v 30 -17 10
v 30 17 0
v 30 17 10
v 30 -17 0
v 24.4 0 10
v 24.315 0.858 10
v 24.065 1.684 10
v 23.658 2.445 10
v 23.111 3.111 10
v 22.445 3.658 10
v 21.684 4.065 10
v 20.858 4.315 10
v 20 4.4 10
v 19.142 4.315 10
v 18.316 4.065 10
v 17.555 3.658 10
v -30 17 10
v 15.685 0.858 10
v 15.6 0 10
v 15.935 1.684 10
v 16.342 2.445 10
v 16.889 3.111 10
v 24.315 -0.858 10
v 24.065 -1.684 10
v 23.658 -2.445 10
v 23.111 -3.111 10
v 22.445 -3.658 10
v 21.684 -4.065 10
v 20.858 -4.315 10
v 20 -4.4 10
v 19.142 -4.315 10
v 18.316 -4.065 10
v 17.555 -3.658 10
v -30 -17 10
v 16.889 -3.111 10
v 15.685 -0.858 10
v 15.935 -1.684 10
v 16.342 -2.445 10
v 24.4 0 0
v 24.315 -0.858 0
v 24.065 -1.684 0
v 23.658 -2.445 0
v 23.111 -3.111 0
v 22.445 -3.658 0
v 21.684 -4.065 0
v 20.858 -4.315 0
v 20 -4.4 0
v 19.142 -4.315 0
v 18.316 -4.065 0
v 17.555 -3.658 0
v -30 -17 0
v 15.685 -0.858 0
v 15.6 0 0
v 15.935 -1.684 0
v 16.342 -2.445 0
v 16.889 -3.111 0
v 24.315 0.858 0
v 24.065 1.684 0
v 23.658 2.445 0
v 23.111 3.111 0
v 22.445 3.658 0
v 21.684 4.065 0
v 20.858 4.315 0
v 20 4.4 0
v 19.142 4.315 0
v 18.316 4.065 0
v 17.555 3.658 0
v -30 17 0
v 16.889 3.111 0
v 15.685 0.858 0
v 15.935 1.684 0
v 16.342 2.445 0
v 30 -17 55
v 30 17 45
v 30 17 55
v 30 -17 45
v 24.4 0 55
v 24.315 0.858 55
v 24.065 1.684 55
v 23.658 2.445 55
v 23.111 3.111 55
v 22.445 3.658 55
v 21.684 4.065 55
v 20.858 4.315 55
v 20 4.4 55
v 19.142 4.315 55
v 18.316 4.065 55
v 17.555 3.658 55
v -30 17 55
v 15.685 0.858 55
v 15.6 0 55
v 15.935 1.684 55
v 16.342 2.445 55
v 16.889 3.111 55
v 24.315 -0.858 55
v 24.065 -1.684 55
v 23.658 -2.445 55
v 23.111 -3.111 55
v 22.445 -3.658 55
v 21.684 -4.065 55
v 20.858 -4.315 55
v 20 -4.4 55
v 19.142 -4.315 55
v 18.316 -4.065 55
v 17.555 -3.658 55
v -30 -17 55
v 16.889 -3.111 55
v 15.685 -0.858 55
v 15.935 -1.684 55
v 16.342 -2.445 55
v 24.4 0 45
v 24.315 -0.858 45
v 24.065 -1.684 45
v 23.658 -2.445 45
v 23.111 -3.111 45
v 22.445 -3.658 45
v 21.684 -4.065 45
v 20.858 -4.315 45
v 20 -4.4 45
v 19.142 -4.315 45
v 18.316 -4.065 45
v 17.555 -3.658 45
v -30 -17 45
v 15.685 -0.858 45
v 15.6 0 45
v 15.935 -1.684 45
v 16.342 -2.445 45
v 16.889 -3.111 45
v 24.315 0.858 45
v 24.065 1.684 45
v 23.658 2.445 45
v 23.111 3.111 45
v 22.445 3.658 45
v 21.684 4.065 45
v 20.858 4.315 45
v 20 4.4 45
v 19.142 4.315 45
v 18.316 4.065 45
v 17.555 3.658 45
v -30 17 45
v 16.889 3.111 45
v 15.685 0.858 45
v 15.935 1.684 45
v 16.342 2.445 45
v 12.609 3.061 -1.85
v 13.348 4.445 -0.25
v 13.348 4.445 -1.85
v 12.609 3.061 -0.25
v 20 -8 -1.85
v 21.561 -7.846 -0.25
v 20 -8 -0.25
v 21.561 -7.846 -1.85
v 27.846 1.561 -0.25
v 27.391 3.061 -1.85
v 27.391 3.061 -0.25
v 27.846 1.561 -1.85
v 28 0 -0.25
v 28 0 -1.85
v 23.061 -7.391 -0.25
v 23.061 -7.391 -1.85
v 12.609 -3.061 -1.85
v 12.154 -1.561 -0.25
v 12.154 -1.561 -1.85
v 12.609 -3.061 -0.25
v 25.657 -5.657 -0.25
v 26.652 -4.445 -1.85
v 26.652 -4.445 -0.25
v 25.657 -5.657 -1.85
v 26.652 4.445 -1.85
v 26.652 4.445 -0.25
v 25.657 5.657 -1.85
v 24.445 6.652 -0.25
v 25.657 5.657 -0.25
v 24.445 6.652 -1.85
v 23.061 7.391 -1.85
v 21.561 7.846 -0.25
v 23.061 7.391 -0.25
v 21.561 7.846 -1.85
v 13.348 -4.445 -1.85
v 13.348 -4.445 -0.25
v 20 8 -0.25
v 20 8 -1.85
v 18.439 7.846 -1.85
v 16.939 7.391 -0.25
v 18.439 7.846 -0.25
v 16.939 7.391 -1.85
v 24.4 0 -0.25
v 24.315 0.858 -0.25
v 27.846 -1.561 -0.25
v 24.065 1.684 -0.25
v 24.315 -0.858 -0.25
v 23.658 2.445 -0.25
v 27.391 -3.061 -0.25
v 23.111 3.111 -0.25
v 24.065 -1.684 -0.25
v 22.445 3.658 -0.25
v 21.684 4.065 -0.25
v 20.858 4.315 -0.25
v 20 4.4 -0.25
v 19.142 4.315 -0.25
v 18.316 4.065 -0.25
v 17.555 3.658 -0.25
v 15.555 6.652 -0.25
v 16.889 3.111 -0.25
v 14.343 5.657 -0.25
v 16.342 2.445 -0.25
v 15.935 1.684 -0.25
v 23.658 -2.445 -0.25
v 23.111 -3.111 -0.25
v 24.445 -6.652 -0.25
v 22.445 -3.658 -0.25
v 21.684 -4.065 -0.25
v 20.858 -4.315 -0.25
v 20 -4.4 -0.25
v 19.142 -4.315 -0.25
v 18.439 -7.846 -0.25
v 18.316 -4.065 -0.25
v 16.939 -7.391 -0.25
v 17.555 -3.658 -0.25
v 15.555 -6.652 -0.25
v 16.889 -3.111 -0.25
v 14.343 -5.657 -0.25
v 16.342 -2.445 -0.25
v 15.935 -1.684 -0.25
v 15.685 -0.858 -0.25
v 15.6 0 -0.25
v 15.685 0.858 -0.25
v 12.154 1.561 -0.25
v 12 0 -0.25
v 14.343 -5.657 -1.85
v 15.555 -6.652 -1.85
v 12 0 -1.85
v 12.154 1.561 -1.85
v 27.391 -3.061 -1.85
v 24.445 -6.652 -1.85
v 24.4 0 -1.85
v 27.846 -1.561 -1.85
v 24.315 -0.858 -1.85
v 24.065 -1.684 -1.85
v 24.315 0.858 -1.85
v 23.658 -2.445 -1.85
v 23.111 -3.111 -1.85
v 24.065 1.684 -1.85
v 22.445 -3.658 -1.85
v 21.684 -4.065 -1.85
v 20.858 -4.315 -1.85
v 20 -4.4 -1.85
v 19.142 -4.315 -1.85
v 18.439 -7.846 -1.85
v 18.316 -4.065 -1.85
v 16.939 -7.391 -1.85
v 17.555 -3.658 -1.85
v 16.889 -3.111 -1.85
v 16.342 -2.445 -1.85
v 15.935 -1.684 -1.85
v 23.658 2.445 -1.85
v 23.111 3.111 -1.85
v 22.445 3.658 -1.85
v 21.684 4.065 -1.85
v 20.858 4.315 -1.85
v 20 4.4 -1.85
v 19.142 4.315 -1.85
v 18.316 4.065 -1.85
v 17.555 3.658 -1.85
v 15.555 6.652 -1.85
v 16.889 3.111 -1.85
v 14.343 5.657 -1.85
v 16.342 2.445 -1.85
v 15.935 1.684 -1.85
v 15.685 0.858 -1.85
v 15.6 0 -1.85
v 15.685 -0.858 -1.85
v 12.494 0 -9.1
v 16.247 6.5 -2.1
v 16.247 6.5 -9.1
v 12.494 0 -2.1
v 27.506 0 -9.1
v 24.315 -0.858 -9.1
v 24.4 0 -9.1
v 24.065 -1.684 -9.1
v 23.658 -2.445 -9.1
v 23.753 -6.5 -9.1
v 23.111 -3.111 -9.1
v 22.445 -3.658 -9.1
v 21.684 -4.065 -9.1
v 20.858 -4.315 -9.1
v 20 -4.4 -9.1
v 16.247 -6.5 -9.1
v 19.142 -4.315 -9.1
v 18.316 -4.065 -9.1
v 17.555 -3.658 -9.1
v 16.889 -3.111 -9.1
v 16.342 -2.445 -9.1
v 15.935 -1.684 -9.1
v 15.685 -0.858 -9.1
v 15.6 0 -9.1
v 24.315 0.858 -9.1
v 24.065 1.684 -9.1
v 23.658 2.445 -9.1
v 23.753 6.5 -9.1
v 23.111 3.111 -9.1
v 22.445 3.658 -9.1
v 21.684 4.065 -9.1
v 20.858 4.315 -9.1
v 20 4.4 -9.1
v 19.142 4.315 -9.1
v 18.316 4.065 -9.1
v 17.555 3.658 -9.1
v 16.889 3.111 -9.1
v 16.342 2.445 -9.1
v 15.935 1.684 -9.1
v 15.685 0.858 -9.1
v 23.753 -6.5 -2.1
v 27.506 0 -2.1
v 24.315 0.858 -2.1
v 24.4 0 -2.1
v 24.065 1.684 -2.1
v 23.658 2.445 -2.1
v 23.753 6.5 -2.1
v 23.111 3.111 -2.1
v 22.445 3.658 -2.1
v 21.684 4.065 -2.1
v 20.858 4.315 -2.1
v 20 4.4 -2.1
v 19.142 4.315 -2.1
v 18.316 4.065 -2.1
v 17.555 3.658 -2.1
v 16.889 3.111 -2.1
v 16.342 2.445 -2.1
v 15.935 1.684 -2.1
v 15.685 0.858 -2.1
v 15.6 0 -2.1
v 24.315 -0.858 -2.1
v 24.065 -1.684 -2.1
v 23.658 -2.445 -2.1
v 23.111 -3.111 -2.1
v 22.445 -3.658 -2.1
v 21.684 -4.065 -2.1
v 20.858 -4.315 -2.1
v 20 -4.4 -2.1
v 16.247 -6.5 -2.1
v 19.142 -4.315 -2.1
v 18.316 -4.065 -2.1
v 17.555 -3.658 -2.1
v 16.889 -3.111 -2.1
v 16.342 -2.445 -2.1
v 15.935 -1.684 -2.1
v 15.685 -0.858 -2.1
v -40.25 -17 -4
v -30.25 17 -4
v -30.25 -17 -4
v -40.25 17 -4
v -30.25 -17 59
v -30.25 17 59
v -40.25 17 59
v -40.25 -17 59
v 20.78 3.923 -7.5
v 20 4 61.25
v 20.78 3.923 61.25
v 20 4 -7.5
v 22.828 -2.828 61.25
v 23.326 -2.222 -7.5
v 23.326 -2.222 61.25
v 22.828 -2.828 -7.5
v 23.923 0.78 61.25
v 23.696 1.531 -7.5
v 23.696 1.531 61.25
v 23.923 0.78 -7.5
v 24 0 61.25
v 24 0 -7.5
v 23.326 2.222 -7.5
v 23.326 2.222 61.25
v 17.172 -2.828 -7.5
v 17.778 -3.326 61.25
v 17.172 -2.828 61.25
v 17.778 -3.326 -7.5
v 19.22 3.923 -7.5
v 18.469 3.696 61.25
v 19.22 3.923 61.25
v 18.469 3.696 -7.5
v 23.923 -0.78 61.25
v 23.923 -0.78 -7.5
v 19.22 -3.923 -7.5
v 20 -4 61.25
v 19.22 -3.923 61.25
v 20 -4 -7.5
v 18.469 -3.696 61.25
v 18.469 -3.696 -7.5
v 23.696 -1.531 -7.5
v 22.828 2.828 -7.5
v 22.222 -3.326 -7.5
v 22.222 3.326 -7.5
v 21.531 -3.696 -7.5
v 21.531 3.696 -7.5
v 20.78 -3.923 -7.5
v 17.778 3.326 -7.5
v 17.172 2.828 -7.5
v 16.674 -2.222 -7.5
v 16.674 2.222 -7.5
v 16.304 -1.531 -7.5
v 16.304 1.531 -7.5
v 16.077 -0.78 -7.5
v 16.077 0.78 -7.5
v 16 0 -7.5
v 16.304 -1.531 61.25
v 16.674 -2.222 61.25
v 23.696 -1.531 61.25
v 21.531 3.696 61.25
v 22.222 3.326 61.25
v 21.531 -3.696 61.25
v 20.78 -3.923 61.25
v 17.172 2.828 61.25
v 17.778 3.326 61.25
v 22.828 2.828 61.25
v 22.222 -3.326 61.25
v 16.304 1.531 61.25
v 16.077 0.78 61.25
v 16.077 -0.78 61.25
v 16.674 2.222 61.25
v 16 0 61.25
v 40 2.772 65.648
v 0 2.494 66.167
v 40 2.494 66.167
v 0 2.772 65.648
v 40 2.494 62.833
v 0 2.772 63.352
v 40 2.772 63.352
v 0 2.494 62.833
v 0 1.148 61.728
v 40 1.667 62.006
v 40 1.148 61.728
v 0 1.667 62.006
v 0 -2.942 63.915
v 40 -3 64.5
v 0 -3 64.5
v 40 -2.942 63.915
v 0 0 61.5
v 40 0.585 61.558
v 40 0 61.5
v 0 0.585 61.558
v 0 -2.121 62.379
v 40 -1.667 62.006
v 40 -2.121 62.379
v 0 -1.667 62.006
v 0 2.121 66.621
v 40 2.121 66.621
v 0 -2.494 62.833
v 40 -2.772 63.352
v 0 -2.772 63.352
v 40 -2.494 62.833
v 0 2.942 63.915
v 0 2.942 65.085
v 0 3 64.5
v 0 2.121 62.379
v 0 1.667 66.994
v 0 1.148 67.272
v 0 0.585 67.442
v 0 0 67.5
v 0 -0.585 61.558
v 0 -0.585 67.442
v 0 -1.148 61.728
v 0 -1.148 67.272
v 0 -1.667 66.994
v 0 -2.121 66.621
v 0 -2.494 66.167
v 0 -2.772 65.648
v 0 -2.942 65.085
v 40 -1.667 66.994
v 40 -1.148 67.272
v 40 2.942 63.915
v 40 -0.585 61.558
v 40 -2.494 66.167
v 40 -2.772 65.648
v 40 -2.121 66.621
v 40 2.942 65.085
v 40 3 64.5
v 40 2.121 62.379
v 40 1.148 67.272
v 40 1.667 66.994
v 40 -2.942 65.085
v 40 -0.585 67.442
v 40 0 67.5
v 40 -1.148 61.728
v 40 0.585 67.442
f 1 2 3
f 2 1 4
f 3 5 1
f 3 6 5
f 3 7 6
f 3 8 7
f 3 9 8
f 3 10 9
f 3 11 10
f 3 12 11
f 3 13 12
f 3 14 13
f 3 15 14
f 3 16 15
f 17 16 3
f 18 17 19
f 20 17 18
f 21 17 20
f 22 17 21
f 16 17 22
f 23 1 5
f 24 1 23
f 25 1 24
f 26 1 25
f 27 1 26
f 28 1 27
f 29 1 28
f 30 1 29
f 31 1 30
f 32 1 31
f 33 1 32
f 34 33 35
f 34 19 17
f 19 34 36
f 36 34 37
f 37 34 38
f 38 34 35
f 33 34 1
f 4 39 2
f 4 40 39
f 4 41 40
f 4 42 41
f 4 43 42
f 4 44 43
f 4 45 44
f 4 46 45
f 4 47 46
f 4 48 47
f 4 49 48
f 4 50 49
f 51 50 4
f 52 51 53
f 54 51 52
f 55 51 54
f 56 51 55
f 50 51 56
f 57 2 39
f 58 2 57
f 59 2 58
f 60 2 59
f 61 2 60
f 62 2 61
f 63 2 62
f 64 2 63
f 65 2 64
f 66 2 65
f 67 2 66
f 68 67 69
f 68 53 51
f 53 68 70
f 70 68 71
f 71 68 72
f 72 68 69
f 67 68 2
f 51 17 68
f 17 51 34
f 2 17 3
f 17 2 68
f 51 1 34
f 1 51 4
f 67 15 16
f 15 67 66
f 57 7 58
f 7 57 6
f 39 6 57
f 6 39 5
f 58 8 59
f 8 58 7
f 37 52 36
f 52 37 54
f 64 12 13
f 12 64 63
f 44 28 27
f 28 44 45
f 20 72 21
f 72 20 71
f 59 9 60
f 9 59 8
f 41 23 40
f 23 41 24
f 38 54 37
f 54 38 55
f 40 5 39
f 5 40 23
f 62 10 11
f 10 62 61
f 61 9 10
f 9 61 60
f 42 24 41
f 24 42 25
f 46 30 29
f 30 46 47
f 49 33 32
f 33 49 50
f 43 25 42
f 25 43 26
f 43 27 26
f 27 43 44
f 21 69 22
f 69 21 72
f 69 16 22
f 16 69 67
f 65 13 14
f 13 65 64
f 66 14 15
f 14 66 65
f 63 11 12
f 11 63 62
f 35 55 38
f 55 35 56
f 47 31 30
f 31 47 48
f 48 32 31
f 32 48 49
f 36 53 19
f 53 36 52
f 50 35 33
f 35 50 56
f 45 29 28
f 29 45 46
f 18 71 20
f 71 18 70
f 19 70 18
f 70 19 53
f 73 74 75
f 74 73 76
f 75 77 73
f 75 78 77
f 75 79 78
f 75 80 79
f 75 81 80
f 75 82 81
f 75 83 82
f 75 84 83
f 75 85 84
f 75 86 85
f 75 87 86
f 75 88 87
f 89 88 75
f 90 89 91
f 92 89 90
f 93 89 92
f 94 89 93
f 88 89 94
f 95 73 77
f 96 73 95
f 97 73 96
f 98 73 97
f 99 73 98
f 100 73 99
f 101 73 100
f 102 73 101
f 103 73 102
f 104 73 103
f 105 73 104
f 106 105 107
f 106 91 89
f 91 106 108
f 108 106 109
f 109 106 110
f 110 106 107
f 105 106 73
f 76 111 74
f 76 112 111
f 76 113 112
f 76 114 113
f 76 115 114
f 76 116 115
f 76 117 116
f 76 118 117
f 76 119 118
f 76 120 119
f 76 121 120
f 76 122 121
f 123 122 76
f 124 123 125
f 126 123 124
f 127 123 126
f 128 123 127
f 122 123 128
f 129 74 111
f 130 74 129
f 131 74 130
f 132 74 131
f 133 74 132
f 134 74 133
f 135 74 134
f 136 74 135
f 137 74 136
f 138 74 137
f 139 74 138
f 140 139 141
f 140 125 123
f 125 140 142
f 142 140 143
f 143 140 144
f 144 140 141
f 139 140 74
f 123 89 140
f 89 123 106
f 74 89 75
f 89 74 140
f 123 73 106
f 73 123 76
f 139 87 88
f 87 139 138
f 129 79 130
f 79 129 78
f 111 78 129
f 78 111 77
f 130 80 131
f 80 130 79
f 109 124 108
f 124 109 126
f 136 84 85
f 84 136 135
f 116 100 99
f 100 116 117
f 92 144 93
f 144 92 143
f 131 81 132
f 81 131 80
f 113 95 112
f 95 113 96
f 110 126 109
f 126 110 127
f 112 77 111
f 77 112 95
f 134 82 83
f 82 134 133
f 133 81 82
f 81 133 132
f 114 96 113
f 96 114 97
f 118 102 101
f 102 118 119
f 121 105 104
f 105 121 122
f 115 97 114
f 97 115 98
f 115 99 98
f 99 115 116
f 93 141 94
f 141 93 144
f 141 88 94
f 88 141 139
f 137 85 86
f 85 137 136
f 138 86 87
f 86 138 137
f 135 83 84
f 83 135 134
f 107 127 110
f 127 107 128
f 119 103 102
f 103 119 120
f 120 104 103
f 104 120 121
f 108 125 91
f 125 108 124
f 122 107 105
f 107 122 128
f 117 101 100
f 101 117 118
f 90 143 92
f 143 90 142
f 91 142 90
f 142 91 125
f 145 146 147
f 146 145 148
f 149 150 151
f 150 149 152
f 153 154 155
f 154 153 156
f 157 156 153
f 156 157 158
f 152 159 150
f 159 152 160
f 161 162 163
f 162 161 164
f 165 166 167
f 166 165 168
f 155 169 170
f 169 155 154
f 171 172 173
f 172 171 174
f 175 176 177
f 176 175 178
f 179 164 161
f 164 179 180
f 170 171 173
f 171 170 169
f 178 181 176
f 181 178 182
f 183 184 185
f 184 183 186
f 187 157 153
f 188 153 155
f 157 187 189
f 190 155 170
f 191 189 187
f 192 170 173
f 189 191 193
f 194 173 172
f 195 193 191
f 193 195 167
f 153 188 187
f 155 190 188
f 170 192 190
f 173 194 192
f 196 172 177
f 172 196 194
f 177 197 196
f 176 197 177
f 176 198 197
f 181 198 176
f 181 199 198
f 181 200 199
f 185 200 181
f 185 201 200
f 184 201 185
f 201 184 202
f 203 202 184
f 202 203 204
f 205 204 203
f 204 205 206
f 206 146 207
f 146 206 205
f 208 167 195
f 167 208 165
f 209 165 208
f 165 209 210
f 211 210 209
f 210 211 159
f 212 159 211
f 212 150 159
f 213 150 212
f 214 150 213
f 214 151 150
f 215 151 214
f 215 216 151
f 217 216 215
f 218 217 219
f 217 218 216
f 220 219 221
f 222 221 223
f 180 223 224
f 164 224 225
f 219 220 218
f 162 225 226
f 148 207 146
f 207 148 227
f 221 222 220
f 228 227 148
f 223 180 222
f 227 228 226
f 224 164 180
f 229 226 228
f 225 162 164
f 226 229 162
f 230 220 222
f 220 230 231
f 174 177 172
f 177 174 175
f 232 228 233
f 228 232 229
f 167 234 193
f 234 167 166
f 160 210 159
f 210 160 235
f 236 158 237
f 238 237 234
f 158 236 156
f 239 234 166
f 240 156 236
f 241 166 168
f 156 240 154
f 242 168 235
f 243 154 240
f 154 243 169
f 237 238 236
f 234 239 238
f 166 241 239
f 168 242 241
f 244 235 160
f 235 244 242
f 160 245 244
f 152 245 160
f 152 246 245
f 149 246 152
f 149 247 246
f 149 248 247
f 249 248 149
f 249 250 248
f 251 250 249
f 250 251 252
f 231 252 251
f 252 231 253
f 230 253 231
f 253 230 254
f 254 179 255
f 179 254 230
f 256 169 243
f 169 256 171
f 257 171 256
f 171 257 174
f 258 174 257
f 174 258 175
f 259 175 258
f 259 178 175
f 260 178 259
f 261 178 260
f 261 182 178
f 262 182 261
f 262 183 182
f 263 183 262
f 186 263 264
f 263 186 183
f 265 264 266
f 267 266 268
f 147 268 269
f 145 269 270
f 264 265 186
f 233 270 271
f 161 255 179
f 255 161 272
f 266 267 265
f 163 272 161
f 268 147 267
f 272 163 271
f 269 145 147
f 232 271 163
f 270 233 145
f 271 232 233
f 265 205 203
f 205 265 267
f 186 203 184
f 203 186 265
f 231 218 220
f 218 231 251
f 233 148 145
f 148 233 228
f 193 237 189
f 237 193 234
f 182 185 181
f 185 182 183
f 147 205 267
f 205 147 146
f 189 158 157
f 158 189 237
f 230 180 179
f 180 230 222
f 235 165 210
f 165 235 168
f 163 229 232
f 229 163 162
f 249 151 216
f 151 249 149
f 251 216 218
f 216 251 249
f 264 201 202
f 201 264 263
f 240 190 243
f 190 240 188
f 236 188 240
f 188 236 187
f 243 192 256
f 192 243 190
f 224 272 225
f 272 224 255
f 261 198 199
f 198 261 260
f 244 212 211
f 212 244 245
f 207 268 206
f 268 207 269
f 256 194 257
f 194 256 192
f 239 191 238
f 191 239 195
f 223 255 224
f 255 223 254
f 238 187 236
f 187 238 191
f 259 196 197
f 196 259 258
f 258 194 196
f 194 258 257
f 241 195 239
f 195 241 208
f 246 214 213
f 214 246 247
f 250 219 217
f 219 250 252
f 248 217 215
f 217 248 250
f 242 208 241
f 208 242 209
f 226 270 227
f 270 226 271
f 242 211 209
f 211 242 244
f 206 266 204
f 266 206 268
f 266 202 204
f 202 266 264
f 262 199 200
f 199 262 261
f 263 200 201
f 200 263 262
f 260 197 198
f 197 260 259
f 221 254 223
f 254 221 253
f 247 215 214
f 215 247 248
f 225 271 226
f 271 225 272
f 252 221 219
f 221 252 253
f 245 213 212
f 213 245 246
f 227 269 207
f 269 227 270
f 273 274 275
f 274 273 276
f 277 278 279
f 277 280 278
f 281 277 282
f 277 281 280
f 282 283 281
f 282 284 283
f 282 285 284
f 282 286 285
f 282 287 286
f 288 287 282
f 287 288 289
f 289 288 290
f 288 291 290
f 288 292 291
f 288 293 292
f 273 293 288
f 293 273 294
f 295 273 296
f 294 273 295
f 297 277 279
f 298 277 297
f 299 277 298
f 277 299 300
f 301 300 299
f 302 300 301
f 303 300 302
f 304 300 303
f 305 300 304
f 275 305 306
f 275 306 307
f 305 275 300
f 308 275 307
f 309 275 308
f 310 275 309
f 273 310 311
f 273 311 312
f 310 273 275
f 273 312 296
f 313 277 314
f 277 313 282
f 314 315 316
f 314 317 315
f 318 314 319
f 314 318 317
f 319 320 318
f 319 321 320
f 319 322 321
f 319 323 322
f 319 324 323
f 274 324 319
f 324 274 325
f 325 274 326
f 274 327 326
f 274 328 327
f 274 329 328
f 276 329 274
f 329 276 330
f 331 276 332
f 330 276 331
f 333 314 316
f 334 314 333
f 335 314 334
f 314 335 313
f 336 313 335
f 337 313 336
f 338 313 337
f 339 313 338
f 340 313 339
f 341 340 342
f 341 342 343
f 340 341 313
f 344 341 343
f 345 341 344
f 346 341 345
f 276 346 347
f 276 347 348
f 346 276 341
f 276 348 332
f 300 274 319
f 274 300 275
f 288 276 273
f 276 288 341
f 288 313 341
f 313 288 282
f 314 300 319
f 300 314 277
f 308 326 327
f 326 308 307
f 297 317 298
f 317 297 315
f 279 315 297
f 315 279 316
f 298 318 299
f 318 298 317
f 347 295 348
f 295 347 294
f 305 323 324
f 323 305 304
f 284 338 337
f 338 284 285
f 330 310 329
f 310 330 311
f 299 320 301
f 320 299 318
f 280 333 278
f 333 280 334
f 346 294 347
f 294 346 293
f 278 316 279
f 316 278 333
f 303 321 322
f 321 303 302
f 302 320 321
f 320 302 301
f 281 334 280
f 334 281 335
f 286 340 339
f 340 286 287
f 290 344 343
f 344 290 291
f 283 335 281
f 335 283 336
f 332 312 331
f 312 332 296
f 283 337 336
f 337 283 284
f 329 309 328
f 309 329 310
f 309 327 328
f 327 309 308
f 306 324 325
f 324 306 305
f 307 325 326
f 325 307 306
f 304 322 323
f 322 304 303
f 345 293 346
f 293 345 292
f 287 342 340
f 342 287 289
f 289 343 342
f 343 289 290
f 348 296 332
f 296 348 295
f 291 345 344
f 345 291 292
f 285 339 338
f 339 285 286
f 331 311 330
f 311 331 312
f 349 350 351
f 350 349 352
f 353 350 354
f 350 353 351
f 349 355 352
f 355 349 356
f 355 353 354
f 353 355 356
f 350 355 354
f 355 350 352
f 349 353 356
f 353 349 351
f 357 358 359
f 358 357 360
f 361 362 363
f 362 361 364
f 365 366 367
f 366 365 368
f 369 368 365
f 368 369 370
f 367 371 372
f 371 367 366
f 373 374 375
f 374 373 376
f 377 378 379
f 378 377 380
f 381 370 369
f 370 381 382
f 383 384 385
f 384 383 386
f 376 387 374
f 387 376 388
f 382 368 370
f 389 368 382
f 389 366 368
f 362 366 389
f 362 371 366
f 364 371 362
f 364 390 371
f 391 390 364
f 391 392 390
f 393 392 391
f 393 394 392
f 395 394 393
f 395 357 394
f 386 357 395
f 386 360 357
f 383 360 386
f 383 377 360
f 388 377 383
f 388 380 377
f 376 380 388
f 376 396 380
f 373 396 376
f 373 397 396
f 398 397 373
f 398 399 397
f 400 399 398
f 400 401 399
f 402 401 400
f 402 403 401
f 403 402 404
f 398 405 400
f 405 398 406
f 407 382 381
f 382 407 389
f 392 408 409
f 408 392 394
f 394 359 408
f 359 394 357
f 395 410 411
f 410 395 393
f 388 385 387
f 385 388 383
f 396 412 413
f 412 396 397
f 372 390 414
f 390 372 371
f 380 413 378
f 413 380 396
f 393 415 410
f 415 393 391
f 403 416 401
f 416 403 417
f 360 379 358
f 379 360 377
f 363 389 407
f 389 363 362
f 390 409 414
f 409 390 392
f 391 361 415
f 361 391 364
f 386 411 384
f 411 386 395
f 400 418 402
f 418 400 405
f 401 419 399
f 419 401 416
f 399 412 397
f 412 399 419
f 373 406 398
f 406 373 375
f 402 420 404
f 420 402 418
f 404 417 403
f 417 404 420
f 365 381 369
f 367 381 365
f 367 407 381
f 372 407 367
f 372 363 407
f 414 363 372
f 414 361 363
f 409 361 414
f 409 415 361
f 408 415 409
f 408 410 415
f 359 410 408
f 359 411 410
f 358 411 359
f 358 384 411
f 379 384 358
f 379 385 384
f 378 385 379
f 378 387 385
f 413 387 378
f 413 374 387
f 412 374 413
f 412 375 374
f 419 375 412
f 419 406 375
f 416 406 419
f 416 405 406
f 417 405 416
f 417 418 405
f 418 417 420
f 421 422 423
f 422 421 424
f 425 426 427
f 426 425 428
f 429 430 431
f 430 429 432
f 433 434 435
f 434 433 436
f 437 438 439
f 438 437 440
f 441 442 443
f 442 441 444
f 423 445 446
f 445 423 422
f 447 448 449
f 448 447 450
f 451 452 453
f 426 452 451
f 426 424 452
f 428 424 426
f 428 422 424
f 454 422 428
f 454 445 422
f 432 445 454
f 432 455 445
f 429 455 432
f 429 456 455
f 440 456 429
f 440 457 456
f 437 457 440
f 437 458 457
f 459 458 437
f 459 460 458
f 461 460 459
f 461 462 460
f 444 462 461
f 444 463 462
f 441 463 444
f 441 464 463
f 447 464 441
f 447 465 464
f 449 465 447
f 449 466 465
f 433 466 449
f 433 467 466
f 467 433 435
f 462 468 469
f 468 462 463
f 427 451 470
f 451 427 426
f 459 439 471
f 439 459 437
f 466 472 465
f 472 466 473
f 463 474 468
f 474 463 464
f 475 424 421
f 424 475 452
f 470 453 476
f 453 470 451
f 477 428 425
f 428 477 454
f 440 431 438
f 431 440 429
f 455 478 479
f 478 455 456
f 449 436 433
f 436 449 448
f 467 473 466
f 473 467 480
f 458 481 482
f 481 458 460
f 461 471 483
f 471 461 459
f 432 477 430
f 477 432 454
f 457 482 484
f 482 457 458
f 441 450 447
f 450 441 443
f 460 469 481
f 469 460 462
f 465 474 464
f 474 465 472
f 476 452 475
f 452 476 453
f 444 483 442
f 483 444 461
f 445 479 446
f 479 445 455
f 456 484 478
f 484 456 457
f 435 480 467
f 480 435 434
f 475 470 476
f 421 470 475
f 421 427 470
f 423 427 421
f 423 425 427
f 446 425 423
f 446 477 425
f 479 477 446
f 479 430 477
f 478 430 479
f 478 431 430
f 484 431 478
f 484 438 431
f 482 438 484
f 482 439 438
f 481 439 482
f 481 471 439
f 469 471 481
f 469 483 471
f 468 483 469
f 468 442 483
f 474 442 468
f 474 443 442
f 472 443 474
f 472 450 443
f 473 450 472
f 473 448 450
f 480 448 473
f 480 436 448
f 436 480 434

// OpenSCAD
$fn = 32;

// ------------------------------------------------------------------------
// C clamp: throat 45 mm, screw d8
// Every part is its own module, assembly() places every instance.
// ------------------------------------------------------------------------

// --- part 1 ---
module clamp_arm() {
  difference() {
    translate([-30, -17, 0]) cube([60, 34, 10]);
    translate([20, 0, -1]) cylinder(h = 12, d = 8.8);
  }
}

// --- part 2 ---
module clamp_spine() {
  difference() {
    translate([-31.5, -17, 0]) cube([63, 34, 10]);
  }
}

// --- part 3 ---
module clamp_screw() {
  translate([0, 0, -34.375]) cylinder(h = 68.75, d = 8);
}

// --- part 4 ---
module clamp_washer() {
  difference() {
      translate([0, 0, 0]) cylinder(h = 1.6, d = 16);
      translate([0, 0, -1]) cylinder(h = 3.6, d = 8.8);
    }
}

// --- part 5 ---
module clamp_nut() {
  difference() {
    linear_extrude(height = 7) polygon(points = [[7.506, 0], [3.753, 6.5], [-3.753, 6.5], [-7.506, 0], [-3.753, -6.5], [3.753, -6.5]]);
    translate([0, 0, -1]) cylinder(h = 9, d = 8.8);
  }
}

// --- part 6 ---
module tommy_bar() {
  translate([0, 0, -20]) cylinder(h = 40, d = 6);
}

// --- assembly ---
module assembly() {
  color([0.80, 0.24, 0.20]) translate([0, 0, 0]) rotate([0, 0, 0]) clamp_arm();
  color([0.20, 0.45, 0.75]) translate([0, 0, 45]) rotate([0, 0, 0]) clamp_arm();
  color([0.25, 0.62, 0.32]) translate([-40.25, 0, 27.5]) rotate([0, 90, 0]) clamp_spine();
  color([0.92, 0.70, 0.18]) translate([20, 0, 26.875]) rotate([0, 0, 0]) clamp_screw();
  color([0.58, 0.35, 0.70]) translate([20, 0, -1.85]) rotate([0, 0, 0]) clamp_washer();
  color([0.16, 0.66, 0.66]) translate([20, 0, -9.1]) rotate([0, 0, 0]) clamp_nut();
  color([0.85, 0.48, 0.18]) translate([20, 0, 64.5]) rotate([0, 90, 0]) tommy_bar();
}

assembly();
